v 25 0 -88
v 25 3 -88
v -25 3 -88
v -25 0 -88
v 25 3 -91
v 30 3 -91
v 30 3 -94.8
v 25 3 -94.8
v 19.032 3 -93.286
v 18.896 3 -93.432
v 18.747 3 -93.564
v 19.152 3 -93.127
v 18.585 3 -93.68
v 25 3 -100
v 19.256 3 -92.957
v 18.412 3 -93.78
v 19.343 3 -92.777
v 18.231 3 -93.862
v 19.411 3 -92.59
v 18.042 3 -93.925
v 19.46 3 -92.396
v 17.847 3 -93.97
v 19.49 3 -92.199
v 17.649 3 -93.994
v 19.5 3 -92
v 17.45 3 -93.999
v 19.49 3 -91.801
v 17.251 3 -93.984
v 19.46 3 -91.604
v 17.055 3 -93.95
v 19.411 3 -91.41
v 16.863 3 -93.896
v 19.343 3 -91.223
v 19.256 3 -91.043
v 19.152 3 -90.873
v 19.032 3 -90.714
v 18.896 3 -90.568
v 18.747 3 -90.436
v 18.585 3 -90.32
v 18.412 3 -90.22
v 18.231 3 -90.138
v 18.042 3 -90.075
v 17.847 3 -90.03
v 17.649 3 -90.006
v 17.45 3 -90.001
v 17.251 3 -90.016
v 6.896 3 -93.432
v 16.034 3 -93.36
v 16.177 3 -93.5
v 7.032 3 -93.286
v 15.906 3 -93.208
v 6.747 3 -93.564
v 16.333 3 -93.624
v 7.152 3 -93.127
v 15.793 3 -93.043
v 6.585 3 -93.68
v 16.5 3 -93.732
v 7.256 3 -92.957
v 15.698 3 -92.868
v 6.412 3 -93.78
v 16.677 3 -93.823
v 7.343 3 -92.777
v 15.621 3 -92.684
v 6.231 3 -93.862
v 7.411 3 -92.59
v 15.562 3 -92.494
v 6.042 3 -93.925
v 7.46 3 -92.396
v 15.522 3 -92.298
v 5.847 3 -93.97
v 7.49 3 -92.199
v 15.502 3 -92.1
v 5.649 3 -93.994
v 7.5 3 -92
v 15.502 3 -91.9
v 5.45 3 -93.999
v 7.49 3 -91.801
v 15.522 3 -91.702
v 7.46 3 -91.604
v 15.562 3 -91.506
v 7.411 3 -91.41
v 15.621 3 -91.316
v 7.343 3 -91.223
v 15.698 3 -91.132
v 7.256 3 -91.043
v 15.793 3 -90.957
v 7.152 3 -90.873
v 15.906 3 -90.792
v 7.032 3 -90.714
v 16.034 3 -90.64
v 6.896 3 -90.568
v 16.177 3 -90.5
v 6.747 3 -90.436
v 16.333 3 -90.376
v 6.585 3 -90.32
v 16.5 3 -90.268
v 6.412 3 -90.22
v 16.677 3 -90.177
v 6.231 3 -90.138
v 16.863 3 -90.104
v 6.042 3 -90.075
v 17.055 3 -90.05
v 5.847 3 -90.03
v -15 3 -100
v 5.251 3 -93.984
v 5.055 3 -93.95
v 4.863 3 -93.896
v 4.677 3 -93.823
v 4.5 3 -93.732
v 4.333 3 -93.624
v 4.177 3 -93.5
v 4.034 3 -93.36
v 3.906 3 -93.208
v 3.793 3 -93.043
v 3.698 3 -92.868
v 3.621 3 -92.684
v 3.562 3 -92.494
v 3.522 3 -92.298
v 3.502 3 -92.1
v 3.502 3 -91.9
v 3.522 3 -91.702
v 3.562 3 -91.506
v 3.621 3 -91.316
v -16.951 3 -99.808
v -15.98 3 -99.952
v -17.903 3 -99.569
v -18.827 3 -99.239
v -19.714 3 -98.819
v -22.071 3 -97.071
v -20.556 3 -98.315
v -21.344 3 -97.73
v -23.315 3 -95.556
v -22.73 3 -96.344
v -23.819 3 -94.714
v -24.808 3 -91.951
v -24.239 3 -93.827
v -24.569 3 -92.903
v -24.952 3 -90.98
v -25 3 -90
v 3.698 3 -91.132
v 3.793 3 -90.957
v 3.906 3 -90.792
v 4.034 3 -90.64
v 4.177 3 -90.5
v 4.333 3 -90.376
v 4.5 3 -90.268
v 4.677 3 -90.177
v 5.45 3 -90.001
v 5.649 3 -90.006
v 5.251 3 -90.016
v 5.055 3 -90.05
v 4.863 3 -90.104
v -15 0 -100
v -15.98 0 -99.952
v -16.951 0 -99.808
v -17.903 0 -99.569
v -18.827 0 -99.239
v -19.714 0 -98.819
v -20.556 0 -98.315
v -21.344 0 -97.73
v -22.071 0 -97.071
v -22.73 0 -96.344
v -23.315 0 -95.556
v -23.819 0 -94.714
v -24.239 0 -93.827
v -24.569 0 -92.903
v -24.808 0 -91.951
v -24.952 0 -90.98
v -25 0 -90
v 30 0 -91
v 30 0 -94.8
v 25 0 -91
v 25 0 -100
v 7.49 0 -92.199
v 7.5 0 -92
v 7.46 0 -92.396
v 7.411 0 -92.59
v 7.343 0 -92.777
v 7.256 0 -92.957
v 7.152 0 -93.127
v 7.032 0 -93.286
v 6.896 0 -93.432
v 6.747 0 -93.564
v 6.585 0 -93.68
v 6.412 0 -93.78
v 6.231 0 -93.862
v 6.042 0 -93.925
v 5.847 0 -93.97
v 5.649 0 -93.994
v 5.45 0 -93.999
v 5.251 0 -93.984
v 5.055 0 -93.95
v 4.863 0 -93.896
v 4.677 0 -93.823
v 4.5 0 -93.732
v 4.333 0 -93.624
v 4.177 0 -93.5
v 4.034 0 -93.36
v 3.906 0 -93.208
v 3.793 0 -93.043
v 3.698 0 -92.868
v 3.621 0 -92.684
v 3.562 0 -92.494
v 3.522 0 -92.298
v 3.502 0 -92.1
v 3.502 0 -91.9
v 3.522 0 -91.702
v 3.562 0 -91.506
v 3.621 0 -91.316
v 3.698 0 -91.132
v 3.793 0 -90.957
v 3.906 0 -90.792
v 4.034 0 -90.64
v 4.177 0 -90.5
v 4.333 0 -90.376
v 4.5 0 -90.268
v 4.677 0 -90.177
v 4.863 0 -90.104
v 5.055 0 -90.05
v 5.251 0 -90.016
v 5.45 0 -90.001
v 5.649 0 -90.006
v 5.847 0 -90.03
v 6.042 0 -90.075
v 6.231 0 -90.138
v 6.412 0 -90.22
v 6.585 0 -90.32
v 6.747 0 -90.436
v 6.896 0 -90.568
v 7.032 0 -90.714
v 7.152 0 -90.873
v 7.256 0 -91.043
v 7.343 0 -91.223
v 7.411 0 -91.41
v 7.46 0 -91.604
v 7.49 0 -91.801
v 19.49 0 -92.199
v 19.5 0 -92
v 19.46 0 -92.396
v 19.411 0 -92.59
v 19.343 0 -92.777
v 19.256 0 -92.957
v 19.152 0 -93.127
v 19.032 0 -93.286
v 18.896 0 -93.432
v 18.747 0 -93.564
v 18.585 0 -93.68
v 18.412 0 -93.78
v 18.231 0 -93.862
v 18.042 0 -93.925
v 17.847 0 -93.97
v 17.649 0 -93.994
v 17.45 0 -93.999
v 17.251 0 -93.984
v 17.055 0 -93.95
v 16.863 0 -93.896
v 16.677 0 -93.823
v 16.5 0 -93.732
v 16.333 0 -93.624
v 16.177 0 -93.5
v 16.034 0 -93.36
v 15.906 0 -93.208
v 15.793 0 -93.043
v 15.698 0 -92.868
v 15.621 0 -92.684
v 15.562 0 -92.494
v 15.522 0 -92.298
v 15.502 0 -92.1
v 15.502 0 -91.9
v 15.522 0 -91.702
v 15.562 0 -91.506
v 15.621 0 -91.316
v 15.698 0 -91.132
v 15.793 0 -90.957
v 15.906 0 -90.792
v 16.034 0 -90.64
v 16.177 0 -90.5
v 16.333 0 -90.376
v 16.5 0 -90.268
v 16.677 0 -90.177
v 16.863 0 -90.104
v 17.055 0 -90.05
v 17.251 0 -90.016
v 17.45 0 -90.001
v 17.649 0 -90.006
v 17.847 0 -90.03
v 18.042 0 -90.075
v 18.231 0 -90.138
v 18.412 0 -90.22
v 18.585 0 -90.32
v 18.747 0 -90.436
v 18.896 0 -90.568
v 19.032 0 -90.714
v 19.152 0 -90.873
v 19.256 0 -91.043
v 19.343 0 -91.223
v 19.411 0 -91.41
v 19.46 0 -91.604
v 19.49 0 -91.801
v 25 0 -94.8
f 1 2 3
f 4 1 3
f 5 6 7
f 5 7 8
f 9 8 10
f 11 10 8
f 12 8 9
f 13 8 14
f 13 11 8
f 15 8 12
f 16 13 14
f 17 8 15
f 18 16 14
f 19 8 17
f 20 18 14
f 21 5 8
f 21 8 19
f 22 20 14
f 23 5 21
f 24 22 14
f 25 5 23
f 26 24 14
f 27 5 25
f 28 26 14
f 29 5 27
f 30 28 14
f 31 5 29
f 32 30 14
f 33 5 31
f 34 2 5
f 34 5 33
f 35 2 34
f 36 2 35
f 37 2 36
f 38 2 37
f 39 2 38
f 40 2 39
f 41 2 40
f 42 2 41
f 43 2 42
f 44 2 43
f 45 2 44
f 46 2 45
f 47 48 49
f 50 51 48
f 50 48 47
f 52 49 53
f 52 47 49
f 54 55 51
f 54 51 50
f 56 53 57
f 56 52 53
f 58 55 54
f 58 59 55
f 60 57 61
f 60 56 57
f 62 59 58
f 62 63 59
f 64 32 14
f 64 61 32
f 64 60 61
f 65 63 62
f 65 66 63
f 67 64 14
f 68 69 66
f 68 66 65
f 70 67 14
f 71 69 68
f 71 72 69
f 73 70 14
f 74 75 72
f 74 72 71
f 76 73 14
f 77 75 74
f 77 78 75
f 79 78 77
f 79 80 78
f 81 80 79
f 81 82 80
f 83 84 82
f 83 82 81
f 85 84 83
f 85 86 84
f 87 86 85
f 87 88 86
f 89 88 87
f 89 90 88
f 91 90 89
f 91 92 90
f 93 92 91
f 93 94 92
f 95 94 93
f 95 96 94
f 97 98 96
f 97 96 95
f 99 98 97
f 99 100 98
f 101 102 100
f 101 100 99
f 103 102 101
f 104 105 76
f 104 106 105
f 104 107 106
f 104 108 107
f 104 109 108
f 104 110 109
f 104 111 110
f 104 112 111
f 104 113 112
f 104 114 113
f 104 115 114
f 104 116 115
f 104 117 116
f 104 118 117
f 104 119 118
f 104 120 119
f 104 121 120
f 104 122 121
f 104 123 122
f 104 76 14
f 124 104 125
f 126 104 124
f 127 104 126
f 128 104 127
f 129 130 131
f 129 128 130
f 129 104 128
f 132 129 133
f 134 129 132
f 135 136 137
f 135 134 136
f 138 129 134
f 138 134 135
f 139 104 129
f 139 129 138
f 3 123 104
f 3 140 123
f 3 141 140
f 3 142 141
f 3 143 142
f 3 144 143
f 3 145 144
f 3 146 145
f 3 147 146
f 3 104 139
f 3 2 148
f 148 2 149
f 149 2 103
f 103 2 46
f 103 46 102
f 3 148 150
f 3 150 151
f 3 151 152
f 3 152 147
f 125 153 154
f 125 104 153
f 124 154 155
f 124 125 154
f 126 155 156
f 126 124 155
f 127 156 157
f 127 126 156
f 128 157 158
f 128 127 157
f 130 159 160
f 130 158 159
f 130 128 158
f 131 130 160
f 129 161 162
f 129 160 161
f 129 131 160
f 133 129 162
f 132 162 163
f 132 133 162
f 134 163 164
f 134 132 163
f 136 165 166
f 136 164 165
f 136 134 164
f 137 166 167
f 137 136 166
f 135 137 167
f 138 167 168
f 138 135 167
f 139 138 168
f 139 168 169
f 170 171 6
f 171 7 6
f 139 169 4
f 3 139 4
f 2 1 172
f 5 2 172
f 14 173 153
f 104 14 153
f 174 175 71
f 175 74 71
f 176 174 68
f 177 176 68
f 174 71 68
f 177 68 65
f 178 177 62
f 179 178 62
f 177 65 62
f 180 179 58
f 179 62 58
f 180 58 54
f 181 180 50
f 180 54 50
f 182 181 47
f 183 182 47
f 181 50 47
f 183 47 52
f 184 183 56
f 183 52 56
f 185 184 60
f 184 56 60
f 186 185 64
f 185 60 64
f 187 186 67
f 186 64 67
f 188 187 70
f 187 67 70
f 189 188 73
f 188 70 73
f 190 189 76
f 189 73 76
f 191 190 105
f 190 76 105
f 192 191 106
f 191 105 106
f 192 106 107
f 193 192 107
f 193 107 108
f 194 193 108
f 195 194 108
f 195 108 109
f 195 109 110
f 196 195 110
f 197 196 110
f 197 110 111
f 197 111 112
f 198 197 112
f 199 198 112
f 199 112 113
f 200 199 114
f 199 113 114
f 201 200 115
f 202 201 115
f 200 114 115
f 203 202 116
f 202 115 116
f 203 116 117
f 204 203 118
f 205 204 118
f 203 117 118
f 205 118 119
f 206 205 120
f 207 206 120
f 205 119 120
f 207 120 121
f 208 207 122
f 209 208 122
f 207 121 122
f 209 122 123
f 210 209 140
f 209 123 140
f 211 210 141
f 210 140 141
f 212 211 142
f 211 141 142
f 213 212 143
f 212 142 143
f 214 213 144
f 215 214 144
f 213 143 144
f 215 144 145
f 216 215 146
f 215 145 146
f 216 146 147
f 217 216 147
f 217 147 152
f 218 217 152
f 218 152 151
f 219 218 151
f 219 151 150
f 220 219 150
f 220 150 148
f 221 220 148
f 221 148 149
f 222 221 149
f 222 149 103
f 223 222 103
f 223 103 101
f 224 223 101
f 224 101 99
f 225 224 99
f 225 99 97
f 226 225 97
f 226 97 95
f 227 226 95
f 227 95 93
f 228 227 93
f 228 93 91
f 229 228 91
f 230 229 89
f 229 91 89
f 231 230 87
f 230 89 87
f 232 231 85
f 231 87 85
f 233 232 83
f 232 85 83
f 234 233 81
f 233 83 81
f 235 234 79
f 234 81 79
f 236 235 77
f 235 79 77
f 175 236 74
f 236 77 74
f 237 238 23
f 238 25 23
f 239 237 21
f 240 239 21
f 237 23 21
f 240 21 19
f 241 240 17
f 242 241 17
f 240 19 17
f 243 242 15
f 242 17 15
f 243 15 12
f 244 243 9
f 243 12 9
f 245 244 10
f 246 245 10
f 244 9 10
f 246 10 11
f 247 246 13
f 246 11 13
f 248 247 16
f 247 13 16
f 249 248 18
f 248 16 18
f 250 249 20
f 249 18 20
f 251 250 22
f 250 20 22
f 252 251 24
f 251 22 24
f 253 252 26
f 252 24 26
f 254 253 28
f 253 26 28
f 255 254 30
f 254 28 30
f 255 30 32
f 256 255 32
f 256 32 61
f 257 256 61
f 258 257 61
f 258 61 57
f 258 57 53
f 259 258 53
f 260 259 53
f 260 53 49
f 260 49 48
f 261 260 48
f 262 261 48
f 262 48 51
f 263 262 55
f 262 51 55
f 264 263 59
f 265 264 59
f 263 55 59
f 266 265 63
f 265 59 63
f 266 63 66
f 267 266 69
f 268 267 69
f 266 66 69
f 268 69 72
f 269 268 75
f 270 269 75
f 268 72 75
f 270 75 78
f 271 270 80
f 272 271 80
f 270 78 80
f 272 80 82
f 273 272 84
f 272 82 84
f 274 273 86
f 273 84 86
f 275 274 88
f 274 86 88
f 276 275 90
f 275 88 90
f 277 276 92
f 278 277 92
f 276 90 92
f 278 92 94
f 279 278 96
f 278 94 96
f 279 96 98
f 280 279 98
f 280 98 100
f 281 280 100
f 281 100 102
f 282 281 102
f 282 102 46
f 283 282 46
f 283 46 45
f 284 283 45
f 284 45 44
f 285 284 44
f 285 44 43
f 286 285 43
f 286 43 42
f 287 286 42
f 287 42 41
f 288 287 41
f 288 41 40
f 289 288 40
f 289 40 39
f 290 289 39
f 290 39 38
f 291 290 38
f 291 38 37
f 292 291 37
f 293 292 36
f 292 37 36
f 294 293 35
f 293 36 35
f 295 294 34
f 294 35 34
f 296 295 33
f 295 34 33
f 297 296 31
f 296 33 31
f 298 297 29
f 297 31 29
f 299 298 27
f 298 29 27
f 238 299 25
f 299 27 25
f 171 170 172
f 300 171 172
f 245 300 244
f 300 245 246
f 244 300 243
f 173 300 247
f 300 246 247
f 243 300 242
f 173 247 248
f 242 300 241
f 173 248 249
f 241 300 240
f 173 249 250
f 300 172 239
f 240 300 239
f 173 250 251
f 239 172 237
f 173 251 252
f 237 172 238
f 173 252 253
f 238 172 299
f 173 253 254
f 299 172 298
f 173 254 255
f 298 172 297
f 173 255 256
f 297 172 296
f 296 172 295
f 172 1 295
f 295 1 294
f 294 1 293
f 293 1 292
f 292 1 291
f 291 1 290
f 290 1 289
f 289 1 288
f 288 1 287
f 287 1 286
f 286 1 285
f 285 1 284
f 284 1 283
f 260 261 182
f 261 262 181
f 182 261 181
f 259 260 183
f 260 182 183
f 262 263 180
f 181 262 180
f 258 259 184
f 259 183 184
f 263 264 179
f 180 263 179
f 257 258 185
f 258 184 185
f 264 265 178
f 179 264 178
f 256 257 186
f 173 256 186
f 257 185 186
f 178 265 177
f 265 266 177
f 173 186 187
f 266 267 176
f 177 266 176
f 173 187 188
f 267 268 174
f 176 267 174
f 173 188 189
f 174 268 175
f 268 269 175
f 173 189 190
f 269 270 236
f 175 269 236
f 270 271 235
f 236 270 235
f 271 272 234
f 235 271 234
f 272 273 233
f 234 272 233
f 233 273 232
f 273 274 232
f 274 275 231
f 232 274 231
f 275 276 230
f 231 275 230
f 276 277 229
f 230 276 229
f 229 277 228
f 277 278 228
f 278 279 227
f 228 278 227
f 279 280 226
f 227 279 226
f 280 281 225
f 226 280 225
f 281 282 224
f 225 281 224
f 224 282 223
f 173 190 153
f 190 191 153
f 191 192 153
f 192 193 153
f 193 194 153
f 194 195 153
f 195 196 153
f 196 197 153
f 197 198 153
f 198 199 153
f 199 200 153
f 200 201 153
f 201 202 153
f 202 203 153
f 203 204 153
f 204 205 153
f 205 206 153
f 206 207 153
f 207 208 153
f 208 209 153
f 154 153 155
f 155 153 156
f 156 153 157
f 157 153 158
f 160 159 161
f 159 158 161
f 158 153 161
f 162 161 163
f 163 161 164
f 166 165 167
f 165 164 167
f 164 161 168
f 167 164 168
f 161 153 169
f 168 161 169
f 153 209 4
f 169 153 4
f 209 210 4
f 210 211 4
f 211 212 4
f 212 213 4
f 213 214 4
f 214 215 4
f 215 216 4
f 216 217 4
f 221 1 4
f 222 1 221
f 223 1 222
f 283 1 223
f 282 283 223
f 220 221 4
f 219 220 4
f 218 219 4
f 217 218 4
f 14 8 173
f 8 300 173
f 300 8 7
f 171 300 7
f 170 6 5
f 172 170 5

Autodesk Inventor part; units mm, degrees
ref_plane "YZ Plane" through (0, 0, 0) normal (1, 0, 0) x (0, 1, 0)
ref_plane "XZ Plane" through (0, 0, 0) normal (0, 1, 0) x (-1, 0, 0)
ref_plane "XY Plane" through (0, 0, 0) normal (0, 0, 1) x (1, 0, 0)
sketch "Sketch1" plane through (0, 0, 0) normal (0, 1, 0) x (-1, 0, 0)
  line L0 (25, 100) -> (-25, 100)
  line L1 (-25, 100) -> (-25, -100)
  line L2 (-25, -100) -> (25, -100)
  line L3 (25, -100) -> (25, 100)
  line L4 (25, 100) -> (-25, -100) construction
  line L5 (-25, 100) -> (25, -100) construction
  point P0 (0, 0)
  dimension "d0" = 200
  dimension "d1" = 50
extrude "Extrusion1" add sketch "Sketch1" along normal blind 3
sketch "Sketch2" plane through (0, 3, 0) normal (0, 1, 0) x (1, 0, 0)
  line L0 (0, 0) -> (25, 0) construction
  line L1 (25, -100) -> (25, 100) projected
  line L2 (25, -92) -> (-15.0756, -92) construction
  circle A0 centre (17.5, -92) radius 2
  circle A1 centre (5.5, -92) radius 2
  line L3 (-25, -100) -> (25, -100) projected
  circle A2 centre (17.5, 92) radius 2
  circle A3 centre (5.5, 92) radius 2
  dimension "d4" = 4
  dimension "d5" = 4
  dimension "d6" = 12
  dimension "d7" = 8
  dimension "d10" = 7.5
extrude "Extrusion2" cut sketch "Sketch2" against normal blind 5
sketch "Sketch3" plane through (0, 3, 0) normal (0, 1, 0) x (1, 0, 0)
  line L0 (19, -85) -> (31, -85)
  line L1 (31, -85) -> (31, 85)
  line L2 (31, 85) -> (19, 85)
  line L3 (19, 85) -> (19, -85)
  line L4 (25, -100) -> (25, 100) projected
  line L5 (19, -85) -> (31, 85) construction
  line L6 (31, -85) -> (19, 85) construction
  point P0 (0, 0)
  point P1 (25, 0)
  dimension "d11" = 170
  dimension "d12" = 12
extrude "Extrusion3" add sketch "Sketch3" against normal blind 3
sketch "Sketch4" plane through (0, 3, 0) normal (0, 1, 0) x (1, 0, 0)
  line L0 (25, -100) -> (25, 100) projected
  line L1 (31, 85) -> (25, 85) projected
  circle A0 centre (26, -75) radius 2
  line L2 (25, -85) -> (31, -85) projected
  line L3 (31, -85) -> (31, 85) projected
  point P0 (0, 0)
  dimension "d15" = 4
  dimension "d16" = 10
  dimension "d17" = 5
extrude "Extrusion4" cut sketch "Sketch4" against normal blind 5 contours A0 L0 | L0 A0
pattern_linear "Rectangular Pattern1" count 6 spacing 30 along (0, 0, -1) of "Extrusion4"
fillet "Fillet1" radius 10 2 edges at (-25, 1.5, -100) (-25, 1.5, 100)
sketch "Sketch5" plane through (0, 3, 0) normal (0, 1, 0) x (1, 0, 0)
  line L0 (31, 85) -> (25, 85) projected
  line L1 (32.3908, 88) -> (-29, 88)
  line L2 (-29, 88) -> (-29, -105)
  line L3 (-29, -105) -> (32.3908, -105)
  line L4 (32.3908, -105) -> (32.3908, 84.997)
  line L5 (32.3908, 84.997) -> (32.3908, 88)
  line L6 (25, 100) -> (-15, 100) projected
  point P0 (0, 0)
  dimension "d31" = 12
extrude "Extrusion5" cut sketch "Sketch5" against normal blind 10
sketch "Sketch6" plane through (0, 3, 0) normal (0, 1, 0) x (1, 0, 0)
  line L0 (25, 94.8) -> (30, 94.8)
  line L1 (30, 94.8) -> (30, 91)
  line L2 (30, 91) -> (25, 91)
  line L3 (25, 91) -> (25, 94.8)
  line L4 (25, 100) -> (-15, 100) projected
  point P0 (0, 0)
  dimension "d26" = 5.2
  dimension "d27" = 5
  dimension "d28" = 3.8
extrude "Extrusion6" add sketch "Sketch6" against normal blind 3
properties part number "Comb4"
